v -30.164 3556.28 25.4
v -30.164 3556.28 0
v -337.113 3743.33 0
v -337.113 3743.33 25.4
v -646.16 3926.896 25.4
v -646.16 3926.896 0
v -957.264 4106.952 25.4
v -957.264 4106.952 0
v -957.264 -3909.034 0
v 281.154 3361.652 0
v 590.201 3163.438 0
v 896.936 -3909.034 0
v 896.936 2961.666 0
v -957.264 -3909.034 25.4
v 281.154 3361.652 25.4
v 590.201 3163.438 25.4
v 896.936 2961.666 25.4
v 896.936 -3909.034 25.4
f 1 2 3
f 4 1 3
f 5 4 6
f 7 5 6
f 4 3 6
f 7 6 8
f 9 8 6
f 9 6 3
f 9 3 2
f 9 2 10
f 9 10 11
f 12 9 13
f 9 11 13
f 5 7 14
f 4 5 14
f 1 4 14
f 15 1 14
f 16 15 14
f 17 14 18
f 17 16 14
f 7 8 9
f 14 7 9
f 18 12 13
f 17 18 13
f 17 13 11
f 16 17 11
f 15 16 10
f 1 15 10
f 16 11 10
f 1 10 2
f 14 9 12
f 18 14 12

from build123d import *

# Parameters (mm, degrees)
F1_DEPTH = 25.4


with BuildPart() as f1:
    # F0 (on Top) → F1 (new body)
    with BuildSketch(Plane.XY):
        with BuildLine():
            Line((-957.263546, 4106.952196), (-957.263546, -3909.033804))
            Line((-957.263546, -3909.033804), (-30.163546, -3909.033804))
            Line((-30.163546, -3909.033804), (-30.163546, 3556.280196))
            ThreePointArc((-30.163546, 3556.280196), (-491.37691, 3835.550108), (-957.263546, 4106.952196))
        make_face()
        with BuildLine():
            Line((-30.163546, 3556.280196), (-30.163546, -3909.033804))
            Line((-30.163546, -3909.033804), (896.936454, -3909.033804))
            Line((896.936454, -3909.033804), (896.936454, 2961.666196))
            ThreePointArc((896.936454, 2961.666196), (435.963579, 3262.991353), (-30.163546, 3556.280196))
        make_face()
    extrude(amount=F1_DEPTH)


solid = f1.part
